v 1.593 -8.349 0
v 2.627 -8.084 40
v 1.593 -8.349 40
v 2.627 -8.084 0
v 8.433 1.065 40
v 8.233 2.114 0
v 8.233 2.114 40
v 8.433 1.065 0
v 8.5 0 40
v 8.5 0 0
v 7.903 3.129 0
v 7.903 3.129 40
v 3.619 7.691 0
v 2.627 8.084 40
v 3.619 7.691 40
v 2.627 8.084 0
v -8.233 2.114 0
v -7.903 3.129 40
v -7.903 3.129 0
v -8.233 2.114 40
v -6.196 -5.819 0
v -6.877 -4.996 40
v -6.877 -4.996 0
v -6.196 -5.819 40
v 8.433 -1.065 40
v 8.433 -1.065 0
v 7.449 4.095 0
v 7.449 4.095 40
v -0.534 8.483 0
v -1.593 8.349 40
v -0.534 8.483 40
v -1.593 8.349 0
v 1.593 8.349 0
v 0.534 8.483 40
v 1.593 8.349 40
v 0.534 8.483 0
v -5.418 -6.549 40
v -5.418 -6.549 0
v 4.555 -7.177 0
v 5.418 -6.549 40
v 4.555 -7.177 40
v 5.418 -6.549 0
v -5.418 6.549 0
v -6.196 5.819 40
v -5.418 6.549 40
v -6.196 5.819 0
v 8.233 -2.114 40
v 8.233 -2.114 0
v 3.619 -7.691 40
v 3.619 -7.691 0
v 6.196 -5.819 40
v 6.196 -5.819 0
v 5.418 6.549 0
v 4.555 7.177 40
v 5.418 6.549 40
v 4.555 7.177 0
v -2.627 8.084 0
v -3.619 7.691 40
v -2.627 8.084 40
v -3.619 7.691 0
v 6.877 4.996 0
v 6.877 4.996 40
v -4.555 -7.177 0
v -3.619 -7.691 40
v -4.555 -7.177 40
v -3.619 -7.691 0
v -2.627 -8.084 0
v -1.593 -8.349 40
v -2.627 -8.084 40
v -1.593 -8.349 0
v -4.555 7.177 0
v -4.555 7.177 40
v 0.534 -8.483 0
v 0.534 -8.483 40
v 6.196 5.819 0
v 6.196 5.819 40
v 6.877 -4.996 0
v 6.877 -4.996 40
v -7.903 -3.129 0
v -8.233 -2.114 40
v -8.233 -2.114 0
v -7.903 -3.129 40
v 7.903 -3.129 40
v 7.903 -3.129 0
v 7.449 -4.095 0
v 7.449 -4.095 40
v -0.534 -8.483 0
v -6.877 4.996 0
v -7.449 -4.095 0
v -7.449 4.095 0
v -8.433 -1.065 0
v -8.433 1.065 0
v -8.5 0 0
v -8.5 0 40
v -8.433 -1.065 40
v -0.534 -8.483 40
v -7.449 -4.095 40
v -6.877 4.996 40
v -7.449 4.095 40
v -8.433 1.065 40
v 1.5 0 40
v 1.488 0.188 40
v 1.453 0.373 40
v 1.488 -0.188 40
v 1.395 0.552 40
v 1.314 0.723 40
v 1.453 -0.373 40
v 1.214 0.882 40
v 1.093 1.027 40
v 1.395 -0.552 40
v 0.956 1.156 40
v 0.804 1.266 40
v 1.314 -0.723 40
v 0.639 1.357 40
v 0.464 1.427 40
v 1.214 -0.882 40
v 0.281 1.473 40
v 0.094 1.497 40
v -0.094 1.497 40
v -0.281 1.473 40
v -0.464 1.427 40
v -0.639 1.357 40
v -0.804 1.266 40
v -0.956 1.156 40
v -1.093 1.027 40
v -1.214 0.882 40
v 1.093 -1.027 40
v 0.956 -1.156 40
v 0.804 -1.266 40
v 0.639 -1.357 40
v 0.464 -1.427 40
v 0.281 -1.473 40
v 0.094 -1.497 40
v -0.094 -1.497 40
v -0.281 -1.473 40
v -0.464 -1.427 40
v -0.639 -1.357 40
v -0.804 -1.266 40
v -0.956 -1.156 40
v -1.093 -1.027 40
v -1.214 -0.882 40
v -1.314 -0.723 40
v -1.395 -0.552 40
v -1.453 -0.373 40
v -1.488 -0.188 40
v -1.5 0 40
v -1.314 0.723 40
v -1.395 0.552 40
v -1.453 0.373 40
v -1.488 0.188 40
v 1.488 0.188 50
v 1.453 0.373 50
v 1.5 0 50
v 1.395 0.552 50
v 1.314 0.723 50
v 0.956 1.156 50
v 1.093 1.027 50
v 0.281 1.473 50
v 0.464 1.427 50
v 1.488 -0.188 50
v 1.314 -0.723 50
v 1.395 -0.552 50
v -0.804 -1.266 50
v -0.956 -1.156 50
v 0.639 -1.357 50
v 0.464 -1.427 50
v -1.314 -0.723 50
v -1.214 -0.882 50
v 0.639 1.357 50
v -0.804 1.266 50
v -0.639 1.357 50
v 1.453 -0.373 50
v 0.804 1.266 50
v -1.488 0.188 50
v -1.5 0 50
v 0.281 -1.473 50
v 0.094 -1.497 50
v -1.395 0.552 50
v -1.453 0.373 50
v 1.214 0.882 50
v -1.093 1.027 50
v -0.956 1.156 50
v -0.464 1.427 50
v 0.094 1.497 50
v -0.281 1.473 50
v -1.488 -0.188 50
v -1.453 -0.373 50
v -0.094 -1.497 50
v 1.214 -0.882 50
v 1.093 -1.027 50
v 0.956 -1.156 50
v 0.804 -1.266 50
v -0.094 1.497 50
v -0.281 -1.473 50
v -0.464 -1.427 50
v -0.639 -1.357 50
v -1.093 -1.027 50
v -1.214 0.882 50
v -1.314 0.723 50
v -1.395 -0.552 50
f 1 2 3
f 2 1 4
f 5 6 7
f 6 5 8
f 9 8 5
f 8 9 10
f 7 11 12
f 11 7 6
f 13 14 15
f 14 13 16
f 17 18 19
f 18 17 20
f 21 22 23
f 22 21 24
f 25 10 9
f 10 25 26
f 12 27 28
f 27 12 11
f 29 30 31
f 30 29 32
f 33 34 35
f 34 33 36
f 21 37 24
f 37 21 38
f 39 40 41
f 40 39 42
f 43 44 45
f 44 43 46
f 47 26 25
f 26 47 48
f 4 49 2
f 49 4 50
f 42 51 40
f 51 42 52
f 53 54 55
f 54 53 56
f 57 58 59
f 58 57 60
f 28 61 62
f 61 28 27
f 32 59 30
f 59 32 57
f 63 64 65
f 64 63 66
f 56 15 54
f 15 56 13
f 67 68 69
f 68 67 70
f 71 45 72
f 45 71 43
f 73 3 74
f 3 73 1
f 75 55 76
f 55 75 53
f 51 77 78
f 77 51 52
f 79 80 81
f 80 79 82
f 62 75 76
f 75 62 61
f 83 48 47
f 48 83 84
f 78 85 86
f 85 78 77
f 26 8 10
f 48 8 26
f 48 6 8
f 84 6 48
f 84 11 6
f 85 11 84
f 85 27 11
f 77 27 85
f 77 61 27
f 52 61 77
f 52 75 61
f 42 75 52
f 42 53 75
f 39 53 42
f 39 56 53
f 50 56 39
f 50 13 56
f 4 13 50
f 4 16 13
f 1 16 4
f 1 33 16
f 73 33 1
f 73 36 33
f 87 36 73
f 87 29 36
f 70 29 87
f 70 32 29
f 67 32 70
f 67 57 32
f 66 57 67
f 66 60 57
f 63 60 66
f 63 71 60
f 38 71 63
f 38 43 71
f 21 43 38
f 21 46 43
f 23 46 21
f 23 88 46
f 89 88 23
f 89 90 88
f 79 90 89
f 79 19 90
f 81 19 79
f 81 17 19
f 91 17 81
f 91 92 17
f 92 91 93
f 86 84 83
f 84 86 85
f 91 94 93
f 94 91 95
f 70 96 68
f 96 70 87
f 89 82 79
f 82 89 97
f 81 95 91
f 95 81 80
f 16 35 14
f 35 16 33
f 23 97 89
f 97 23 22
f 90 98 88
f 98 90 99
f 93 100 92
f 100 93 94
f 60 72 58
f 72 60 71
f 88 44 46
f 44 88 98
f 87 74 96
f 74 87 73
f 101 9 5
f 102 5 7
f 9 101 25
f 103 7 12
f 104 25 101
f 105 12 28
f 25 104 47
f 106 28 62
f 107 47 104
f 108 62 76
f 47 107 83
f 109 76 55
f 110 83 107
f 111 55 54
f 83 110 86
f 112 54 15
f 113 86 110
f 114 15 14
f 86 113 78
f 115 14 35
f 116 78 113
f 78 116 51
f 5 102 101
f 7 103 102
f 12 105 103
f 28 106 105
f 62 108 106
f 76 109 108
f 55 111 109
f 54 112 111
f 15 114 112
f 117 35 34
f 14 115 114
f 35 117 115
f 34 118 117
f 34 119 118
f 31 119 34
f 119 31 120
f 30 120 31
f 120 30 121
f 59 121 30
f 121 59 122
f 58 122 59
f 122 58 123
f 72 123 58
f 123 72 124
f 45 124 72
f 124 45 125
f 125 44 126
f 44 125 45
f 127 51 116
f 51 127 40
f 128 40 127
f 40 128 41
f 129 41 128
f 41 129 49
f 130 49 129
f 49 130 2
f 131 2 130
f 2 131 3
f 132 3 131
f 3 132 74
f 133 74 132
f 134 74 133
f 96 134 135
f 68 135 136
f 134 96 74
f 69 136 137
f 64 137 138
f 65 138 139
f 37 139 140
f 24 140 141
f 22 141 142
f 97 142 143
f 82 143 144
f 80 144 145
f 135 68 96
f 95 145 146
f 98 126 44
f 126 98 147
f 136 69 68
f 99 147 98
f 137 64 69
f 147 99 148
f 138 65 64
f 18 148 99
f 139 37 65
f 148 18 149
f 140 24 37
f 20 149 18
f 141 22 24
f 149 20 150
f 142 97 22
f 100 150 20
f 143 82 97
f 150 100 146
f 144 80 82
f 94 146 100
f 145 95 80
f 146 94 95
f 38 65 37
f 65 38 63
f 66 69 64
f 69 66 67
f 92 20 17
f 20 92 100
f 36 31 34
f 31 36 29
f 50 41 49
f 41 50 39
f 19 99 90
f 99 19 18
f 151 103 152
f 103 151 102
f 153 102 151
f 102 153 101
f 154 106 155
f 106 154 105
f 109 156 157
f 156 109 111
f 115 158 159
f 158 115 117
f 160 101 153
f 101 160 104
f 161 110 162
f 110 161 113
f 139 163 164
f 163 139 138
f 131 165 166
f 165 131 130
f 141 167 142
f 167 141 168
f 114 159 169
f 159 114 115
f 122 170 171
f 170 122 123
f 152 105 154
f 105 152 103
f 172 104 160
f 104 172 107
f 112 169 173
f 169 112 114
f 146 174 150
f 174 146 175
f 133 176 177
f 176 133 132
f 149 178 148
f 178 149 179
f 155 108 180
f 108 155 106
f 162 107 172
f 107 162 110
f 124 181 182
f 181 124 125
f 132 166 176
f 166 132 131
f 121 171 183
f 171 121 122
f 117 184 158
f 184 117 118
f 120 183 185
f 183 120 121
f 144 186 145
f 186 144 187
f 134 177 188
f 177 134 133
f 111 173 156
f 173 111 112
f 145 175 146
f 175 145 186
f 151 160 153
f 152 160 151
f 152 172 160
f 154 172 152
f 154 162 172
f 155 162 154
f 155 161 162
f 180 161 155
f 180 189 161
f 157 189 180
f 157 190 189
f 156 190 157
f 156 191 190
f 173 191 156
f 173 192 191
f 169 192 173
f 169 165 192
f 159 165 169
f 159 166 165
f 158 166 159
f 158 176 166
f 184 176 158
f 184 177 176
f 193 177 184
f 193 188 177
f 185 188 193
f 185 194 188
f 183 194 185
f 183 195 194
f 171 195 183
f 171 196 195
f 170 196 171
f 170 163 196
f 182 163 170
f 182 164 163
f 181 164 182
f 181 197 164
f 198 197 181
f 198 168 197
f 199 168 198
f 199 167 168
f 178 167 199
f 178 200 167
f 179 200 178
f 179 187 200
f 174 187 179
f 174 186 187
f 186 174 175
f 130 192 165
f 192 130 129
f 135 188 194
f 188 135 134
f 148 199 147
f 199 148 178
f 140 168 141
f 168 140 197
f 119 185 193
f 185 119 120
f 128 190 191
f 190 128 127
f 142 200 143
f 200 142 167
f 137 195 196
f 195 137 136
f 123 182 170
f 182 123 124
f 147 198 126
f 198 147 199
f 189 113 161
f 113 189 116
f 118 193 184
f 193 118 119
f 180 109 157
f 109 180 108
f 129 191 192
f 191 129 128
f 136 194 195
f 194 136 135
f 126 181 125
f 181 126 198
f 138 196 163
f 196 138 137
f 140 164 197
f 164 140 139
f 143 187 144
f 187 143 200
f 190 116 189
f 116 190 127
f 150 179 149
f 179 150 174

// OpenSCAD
// file: params_dc_motor.scad
// Author: Mihai Oltean, www.tcreate.org, mihai.oltean@gmail.com
// More details: jenny5.org
// Source: github.com/jenny5-robot
// MIT License
//--------------------------------------------------------------

motor_length = 12;
motor_width = 10;
motor_height = 26;
motor_shaft_length = 10;


motor_zga17_length = 40;
motor_zga17_radius = 8.5;
motor_zga17_distance_between_screws = 11;
// main file
// Author: Mihai Oltean, www.tcreate.org, mihai.oltean@gmail.com
// More details: jenny5.org
// Source: github.com/jenny5-robot
// MIT License
//--------------------------------------------------------------

include <params_dc_motor.scad>

//--------------------------------------------------------------
module dc_motor()
{
	union(){
	translate ([-motor_length / 2, -motor_width / 2, 0]) cube([motor_length, motor_width, motor_height]);
	translate ([0, 0, motor_height]) cylinder (h = motor_shaft_length, r = 1.5, $fn = 10);
	}
}
//--------------------------------------------------------------
module motor_zga17()
{
    cylinder(h = motor_zga17_length, r = motor_zga17_radius, $fn = 50);
    translate ([0, 0, motor_zga17_length]) cylinder(h = 10, r = 1.5, $fn = 50);
}
//--------------------------------------------------------------

motor_zga17();
